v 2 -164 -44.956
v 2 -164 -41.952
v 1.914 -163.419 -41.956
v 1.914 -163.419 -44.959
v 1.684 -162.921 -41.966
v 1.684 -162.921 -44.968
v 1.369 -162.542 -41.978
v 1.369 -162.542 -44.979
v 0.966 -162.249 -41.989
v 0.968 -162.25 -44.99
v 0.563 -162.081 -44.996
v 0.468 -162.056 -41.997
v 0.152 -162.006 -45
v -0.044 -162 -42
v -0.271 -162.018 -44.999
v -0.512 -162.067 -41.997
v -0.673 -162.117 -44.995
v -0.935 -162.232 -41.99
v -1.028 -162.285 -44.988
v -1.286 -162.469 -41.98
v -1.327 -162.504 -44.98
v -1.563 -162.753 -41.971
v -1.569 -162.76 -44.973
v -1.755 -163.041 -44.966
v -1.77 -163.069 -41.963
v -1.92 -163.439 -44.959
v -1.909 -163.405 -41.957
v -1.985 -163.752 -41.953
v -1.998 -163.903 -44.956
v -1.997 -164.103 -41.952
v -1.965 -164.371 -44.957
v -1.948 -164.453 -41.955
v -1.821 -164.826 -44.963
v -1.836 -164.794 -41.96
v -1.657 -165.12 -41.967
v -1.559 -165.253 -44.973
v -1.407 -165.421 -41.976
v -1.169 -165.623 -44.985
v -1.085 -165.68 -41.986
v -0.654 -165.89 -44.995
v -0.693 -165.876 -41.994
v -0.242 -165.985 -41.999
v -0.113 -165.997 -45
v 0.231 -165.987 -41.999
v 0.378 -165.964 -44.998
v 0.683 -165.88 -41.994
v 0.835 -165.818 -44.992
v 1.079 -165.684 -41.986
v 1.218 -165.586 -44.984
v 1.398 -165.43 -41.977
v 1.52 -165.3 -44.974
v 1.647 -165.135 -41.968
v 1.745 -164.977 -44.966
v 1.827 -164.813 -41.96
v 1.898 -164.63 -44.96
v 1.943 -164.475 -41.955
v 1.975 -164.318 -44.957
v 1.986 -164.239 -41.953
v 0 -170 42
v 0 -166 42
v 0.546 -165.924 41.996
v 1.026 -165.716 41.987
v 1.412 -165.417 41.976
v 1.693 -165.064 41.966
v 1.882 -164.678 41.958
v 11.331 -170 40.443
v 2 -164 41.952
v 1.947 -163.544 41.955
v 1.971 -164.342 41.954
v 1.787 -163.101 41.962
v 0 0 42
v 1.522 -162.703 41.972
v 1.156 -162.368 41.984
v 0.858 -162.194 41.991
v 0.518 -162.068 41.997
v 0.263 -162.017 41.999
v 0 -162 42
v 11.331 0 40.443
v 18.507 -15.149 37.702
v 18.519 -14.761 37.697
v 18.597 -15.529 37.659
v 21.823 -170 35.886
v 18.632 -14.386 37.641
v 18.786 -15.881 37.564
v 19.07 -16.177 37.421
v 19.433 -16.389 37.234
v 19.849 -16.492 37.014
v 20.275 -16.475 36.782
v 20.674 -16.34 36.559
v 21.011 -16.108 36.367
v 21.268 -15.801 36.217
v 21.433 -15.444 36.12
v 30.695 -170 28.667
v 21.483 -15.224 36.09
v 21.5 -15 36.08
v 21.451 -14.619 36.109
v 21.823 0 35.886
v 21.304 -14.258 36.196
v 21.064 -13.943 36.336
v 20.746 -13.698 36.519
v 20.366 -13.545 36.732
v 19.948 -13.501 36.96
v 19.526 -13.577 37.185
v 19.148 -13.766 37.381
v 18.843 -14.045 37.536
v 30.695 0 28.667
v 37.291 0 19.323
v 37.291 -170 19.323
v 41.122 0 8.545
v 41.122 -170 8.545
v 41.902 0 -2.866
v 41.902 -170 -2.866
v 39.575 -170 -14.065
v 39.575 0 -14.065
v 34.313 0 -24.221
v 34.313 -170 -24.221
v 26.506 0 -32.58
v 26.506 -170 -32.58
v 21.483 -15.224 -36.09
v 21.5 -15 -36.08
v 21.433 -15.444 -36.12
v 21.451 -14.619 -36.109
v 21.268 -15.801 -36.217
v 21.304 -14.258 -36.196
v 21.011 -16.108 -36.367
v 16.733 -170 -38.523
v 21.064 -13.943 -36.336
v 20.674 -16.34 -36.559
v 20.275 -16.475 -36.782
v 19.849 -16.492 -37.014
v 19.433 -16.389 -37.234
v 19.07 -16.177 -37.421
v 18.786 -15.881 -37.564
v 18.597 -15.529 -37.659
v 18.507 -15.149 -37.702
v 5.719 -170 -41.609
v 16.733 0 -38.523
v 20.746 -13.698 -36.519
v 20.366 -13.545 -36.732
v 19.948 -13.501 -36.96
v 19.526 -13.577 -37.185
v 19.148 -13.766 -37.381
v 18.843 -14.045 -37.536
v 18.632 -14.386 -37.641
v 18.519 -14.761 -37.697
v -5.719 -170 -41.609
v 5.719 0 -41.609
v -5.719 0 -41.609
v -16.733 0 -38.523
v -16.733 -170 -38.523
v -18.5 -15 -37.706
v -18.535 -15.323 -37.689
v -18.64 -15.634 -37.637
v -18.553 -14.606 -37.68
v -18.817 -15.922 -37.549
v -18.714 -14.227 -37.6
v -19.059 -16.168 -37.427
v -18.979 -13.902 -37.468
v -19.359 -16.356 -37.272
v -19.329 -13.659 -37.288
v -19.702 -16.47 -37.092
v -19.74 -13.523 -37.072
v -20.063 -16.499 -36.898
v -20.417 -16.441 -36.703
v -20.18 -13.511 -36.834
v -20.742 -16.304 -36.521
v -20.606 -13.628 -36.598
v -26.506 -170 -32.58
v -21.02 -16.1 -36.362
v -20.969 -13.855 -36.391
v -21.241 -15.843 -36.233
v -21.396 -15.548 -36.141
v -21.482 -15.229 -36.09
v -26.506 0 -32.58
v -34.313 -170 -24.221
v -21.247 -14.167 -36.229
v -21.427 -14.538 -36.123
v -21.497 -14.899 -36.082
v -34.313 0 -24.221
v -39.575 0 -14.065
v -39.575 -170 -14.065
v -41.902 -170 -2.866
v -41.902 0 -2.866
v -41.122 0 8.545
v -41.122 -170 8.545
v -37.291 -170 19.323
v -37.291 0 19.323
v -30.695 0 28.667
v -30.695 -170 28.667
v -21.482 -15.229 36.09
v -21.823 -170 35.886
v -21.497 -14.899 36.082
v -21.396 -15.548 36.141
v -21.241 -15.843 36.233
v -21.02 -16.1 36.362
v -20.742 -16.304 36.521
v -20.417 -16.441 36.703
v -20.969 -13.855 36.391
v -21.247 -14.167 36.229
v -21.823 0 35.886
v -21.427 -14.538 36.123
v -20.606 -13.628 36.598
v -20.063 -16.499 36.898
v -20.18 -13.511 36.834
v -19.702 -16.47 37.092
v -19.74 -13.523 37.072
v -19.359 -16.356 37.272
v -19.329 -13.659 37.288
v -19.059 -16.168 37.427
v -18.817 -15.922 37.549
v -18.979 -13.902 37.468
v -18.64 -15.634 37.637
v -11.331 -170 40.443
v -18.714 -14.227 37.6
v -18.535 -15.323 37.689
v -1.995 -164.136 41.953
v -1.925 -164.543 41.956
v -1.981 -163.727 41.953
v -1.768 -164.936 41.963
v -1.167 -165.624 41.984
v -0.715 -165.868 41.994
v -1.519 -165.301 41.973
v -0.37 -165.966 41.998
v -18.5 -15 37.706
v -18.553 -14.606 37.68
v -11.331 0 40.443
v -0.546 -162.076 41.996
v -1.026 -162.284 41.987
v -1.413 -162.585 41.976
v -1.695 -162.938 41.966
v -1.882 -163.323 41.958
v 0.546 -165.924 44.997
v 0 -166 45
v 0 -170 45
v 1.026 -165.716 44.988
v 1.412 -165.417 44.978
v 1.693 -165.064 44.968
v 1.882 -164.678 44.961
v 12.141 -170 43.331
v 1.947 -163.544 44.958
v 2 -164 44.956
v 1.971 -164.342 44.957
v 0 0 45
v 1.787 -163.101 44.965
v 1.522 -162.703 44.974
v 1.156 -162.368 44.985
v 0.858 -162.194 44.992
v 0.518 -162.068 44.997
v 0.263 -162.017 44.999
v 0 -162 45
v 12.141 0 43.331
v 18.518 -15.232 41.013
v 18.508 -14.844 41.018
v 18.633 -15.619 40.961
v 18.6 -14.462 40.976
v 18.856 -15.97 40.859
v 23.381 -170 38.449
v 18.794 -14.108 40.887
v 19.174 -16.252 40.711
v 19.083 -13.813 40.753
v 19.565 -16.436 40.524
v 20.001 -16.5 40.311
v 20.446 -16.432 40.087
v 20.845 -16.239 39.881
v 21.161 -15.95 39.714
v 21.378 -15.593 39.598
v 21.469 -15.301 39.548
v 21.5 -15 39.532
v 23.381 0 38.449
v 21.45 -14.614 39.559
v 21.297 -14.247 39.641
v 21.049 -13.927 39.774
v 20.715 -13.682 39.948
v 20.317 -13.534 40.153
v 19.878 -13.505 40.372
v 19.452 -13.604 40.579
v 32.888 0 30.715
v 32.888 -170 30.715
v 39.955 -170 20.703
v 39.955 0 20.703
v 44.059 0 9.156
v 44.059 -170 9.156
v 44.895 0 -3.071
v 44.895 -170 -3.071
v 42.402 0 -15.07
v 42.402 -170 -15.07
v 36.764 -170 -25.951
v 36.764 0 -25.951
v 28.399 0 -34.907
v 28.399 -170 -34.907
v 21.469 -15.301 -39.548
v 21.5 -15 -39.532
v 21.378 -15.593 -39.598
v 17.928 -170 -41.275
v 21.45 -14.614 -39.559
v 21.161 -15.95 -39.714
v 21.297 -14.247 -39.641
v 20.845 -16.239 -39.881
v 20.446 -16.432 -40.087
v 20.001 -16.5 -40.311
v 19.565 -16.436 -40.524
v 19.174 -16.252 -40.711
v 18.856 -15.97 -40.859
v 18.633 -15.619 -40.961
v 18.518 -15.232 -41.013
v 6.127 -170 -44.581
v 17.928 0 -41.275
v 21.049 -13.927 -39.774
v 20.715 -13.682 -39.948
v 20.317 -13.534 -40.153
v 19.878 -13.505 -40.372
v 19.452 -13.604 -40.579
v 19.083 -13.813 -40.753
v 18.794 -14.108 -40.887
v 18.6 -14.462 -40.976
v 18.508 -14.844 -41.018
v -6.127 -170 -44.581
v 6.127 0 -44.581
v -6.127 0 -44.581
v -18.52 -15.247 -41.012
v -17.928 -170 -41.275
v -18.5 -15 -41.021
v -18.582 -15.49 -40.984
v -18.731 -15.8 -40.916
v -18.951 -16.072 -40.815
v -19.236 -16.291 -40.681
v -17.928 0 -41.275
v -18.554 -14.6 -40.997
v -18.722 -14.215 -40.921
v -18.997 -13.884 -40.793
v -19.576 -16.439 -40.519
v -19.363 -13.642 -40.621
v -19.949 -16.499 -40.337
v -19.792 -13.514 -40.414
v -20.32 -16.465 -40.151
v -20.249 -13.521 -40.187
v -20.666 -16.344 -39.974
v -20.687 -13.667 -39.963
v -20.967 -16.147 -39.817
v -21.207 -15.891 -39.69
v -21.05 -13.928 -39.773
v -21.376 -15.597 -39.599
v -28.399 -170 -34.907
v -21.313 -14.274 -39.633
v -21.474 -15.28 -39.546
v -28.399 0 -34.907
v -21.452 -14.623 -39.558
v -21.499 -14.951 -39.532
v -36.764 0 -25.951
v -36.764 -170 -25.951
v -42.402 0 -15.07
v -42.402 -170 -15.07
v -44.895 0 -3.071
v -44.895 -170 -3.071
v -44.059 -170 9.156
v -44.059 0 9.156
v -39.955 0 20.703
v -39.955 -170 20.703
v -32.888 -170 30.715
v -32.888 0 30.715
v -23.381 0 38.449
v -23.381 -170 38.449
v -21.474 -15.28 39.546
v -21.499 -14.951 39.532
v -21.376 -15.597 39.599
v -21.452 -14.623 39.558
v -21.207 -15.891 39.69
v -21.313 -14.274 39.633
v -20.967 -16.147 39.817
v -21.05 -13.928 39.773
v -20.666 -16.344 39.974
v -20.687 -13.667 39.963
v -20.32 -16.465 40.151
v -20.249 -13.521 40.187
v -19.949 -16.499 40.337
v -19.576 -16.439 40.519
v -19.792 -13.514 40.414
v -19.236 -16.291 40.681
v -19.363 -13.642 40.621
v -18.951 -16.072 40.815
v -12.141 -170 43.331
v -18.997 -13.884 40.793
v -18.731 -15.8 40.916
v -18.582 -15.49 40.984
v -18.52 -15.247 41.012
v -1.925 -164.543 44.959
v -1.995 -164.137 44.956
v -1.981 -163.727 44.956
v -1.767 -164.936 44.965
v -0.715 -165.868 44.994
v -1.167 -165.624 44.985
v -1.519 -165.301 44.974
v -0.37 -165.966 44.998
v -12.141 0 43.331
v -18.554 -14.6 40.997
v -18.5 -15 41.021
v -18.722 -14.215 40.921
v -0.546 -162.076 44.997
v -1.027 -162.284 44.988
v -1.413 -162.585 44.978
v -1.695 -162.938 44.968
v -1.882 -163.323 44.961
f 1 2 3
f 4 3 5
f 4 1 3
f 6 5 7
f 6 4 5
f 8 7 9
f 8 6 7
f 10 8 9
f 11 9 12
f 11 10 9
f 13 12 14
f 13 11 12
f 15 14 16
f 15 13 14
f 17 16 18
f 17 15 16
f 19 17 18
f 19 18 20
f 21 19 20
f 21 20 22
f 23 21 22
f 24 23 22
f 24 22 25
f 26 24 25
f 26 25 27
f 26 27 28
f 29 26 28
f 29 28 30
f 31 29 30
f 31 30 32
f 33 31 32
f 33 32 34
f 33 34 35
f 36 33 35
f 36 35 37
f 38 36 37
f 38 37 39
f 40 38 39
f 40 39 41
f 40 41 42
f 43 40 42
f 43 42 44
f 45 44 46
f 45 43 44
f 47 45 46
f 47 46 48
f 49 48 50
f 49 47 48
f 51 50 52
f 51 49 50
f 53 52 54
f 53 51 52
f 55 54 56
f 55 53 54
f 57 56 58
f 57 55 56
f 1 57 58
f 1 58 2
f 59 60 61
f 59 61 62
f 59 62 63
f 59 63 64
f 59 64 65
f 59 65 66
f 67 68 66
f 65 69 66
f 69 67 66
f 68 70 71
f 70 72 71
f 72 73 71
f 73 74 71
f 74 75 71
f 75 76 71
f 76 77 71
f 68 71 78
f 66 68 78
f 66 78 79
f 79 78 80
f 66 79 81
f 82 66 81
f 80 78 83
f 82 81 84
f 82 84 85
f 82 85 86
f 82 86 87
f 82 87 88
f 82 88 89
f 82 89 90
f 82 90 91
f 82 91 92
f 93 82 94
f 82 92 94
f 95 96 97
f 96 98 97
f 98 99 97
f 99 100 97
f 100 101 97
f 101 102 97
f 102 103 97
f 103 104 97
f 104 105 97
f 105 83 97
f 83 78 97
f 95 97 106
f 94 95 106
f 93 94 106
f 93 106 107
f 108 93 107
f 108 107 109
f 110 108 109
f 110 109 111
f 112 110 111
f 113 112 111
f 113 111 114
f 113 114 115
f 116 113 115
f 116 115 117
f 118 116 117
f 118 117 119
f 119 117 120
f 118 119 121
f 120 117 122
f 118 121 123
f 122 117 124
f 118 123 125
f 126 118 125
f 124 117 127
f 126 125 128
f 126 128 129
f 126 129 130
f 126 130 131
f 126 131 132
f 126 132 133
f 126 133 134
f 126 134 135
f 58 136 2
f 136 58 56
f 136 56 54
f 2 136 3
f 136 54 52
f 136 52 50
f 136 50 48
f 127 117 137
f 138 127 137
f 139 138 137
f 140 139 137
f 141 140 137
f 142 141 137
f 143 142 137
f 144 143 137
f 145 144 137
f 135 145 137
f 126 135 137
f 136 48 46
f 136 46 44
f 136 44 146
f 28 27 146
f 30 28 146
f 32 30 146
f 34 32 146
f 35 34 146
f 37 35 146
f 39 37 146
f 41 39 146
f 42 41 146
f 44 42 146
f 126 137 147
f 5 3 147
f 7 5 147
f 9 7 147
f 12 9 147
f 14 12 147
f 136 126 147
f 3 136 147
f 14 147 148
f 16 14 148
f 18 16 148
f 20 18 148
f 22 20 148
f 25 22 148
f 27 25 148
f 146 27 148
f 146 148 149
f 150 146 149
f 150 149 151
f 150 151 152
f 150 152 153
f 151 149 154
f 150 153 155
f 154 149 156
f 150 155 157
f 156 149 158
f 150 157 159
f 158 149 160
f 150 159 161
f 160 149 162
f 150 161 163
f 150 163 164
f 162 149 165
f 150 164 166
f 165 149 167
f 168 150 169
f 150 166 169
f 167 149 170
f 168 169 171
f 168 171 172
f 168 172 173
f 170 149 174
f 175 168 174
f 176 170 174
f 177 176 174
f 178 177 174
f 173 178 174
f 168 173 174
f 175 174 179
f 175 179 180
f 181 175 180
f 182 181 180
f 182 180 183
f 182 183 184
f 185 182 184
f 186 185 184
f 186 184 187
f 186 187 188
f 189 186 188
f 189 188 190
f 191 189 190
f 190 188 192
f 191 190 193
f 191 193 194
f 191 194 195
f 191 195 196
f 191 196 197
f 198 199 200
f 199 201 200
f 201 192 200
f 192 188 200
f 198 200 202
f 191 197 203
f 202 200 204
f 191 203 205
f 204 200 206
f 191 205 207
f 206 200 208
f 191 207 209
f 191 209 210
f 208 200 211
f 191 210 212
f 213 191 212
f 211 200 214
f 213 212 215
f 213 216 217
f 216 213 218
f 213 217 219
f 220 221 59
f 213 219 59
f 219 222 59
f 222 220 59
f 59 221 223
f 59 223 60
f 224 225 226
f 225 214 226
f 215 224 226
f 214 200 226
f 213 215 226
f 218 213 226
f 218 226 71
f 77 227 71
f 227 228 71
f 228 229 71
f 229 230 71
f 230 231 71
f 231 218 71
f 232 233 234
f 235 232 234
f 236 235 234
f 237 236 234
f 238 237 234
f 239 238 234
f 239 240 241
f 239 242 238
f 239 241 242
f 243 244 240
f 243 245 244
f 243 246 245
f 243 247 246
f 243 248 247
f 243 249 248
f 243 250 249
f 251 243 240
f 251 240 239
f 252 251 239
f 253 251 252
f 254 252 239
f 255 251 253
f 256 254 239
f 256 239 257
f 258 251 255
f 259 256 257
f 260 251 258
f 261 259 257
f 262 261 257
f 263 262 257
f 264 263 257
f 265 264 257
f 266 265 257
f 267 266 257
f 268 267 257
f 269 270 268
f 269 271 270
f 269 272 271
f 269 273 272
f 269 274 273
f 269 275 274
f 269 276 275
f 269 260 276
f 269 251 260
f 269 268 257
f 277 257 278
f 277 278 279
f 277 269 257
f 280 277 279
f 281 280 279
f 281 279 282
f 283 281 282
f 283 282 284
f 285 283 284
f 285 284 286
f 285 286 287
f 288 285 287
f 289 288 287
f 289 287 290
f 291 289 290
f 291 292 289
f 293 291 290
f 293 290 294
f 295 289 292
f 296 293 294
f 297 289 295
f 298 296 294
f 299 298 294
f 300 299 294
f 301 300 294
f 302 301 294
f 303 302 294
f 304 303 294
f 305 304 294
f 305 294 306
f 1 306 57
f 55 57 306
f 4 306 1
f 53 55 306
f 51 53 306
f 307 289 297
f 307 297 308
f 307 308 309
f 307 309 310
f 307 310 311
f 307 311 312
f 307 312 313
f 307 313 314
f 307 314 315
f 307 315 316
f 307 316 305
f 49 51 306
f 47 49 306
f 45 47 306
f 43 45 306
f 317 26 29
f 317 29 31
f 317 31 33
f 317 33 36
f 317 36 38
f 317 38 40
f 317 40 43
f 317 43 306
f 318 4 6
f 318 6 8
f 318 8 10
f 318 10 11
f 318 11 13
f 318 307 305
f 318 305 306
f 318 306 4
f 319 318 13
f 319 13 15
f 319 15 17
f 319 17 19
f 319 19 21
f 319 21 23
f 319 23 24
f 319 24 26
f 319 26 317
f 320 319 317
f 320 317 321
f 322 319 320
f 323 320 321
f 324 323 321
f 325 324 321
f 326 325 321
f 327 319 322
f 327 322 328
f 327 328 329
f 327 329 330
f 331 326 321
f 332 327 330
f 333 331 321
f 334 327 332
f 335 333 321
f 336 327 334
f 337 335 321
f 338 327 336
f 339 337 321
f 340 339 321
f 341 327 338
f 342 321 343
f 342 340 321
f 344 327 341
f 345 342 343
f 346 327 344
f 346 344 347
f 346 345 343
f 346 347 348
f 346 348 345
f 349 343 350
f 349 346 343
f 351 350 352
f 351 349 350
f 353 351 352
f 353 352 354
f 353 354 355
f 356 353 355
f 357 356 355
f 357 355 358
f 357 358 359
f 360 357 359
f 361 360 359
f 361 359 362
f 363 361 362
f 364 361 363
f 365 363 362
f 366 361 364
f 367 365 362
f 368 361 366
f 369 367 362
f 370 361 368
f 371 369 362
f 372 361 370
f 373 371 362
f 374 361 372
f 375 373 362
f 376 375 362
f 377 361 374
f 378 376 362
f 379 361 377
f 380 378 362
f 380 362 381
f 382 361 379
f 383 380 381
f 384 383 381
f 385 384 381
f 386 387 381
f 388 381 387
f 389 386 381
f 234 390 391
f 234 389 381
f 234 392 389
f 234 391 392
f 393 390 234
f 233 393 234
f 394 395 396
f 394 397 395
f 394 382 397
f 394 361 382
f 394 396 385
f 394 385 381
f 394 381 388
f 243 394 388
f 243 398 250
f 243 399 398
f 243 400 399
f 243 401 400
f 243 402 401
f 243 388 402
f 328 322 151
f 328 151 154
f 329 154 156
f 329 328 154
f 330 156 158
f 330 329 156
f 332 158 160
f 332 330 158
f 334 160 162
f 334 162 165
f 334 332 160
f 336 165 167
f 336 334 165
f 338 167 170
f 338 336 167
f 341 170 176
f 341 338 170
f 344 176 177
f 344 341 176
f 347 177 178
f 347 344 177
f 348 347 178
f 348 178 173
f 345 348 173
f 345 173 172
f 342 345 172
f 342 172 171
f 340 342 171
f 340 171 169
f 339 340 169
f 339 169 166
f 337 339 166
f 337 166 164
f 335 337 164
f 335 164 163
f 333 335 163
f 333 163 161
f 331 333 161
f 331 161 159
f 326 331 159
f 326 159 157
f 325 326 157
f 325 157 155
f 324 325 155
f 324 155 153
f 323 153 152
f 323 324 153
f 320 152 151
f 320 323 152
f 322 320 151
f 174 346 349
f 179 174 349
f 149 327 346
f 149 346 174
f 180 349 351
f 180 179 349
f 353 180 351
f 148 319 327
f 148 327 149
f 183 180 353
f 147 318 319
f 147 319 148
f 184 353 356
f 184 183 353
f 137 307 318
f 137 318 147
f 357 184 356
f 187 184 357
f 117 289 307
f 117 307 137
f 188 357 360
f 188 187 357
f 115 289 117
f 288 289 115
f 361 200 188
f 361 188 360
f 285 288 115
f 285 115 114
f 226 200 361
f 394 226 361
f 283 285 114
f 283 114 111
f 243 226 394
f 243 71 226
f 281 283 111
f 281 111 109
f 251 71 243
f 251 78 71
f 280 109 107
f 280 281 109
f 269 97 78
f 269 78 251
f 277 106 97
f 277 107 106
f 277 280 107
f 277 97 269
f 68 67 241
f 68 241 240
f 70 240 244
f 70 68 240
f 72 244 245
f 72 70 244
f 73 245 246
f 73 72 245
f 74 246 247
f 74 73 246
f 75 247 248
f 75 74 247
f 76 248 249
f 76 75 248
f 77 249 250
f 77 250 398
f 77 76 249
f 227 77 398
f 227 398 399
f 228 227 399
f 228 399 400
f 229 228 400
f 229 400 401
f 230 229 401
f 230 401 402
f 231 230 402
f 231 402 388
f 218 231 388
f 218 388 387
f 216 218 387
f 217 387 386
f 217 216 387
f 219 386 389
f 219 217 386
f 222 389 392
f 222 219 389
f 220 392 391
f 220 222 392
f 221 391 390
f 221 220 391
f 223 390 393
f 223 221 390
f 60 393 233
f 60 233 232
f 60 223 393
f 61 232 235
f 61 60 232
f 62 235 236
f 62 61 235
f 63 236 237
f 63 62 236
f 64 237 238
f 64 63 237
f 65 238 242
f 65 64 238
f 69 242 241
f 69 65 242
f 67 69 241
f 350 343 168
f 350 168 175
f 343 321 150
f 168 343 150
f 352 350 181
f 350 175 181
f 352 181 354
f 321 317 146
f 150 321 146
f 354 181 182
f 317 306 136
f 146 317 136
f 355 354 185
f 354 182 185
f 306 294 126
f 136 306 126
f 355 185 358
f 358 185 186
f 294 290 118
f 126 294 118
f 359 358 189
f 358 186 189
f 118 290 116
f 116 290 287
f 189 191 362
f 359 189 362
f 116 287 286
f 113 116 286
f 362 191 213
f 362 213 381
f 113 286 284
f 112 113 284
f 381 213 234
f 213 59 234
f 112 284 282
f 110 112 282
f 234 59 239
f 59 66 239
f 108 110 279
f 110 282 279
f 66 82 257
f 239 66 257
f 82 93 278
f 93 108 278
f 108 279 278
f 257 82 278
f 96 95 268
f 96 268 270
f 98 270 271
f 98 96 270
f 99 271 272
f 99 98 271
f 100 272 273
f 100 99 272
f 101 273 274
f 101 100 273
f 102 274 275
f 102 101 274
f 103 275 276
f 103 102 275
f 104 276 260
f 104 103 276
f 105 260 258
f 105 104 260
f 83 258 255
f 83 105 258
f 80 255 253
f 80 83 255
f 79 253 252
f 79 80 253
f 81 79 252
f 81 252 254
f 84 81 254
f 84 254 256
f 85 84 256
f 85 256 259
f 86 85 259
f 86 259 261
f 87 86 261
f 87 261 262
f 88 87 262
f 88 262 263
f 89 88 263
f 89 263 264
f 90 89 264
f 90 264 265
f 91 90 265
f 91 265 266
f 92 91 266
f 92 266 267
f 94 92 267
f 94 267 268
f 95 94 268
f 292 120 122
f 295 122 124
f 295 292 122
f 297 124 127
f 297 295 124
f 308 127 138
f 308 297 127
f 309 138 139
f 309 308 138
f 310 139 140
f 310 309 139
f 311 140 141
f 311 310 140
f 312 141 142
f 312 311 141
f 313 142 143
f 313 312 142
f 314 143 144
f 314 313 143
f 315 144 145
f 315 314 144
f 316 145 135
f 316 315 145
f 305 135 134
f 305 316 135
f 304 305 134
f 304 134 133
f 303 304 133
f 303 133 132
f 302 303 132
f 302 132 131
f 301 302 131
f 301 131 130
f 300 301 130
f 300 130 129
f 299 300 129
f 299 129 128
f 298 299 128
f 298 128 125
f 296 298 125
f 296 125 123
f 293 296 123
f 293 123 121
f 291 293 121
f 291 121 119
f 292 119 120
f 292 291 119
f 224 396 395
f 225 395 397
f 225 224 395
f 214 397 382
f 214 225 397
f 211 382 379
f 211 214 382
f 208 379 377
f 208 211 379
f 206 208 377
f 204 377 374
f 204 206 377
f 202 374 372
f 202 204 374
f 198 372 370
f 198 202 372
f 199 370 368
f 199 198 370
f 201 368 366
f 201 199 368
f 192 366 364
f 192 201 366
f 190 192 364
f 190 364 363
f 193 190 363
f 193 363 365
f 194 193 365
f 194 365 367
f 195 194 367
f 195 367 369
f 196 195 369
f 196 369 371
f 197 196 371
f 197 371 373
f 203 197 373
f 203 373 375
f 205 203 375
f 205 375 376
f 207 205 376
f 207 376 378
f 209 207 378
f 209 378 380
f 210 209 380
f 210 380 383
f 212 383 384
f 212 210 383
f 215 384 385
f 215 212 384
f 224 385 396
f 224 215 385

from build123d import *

# Parameters (mm, degrees)
SKETCH1_R               = 45
SKETCH1_R_2             = 42
BOSS_EXTRUDE1_DEPTH     = 170
CUT_EXTRUDE1_DEPTH      = 182.521348607
CUT_EXTRUDE1_DEPTH_BACK = 182.521348607
SKETCH2_R               = 2
SKETCH2_R_2             = 1.5


with BuildPart() as part:
    # Sketch1 → Boss-Extrude1 (new body)
    with BuildSketch(Plane(origin=(0, 0, 0), x_dir=(1, 0, 0), z_dir=(0, 1, 0))):
        with Locations(Location((0, 0, 0), (0, 0, 270))):
            Circle(SKETCH1_R)
        with Locations(Location((0, 0, 0), (0, 0, 270))):
            Circle(SKETCH1_R_2, mode=Mode.SUBTRACT)
    extrude(amount=-BOSS_EXTRUDE1_DEPTH)

    # Sketch2 → Cut-Extrude1 (cut, two sides: drawn at the far end of the back side and taken through both)
    with BuildSketch(Plane.XY.offset(-CUT_EXTRUDE1_DEPTH_BACK)):
        with Locations((0, -164)):
            Circle(SKETCH2_R)
        with Locations((-20, -15)):
            Circle(SKETCH2_R_2)
        with Locations((20, -15)):
            Circle(SKETCH2_R_2)
    extrude(amount=CUT_EXTRUDE1_DEPTH + CUT_EXTRUDE1_DEPTH_BACK, mode=Mode.SUBTRACT)


solid = part.part
